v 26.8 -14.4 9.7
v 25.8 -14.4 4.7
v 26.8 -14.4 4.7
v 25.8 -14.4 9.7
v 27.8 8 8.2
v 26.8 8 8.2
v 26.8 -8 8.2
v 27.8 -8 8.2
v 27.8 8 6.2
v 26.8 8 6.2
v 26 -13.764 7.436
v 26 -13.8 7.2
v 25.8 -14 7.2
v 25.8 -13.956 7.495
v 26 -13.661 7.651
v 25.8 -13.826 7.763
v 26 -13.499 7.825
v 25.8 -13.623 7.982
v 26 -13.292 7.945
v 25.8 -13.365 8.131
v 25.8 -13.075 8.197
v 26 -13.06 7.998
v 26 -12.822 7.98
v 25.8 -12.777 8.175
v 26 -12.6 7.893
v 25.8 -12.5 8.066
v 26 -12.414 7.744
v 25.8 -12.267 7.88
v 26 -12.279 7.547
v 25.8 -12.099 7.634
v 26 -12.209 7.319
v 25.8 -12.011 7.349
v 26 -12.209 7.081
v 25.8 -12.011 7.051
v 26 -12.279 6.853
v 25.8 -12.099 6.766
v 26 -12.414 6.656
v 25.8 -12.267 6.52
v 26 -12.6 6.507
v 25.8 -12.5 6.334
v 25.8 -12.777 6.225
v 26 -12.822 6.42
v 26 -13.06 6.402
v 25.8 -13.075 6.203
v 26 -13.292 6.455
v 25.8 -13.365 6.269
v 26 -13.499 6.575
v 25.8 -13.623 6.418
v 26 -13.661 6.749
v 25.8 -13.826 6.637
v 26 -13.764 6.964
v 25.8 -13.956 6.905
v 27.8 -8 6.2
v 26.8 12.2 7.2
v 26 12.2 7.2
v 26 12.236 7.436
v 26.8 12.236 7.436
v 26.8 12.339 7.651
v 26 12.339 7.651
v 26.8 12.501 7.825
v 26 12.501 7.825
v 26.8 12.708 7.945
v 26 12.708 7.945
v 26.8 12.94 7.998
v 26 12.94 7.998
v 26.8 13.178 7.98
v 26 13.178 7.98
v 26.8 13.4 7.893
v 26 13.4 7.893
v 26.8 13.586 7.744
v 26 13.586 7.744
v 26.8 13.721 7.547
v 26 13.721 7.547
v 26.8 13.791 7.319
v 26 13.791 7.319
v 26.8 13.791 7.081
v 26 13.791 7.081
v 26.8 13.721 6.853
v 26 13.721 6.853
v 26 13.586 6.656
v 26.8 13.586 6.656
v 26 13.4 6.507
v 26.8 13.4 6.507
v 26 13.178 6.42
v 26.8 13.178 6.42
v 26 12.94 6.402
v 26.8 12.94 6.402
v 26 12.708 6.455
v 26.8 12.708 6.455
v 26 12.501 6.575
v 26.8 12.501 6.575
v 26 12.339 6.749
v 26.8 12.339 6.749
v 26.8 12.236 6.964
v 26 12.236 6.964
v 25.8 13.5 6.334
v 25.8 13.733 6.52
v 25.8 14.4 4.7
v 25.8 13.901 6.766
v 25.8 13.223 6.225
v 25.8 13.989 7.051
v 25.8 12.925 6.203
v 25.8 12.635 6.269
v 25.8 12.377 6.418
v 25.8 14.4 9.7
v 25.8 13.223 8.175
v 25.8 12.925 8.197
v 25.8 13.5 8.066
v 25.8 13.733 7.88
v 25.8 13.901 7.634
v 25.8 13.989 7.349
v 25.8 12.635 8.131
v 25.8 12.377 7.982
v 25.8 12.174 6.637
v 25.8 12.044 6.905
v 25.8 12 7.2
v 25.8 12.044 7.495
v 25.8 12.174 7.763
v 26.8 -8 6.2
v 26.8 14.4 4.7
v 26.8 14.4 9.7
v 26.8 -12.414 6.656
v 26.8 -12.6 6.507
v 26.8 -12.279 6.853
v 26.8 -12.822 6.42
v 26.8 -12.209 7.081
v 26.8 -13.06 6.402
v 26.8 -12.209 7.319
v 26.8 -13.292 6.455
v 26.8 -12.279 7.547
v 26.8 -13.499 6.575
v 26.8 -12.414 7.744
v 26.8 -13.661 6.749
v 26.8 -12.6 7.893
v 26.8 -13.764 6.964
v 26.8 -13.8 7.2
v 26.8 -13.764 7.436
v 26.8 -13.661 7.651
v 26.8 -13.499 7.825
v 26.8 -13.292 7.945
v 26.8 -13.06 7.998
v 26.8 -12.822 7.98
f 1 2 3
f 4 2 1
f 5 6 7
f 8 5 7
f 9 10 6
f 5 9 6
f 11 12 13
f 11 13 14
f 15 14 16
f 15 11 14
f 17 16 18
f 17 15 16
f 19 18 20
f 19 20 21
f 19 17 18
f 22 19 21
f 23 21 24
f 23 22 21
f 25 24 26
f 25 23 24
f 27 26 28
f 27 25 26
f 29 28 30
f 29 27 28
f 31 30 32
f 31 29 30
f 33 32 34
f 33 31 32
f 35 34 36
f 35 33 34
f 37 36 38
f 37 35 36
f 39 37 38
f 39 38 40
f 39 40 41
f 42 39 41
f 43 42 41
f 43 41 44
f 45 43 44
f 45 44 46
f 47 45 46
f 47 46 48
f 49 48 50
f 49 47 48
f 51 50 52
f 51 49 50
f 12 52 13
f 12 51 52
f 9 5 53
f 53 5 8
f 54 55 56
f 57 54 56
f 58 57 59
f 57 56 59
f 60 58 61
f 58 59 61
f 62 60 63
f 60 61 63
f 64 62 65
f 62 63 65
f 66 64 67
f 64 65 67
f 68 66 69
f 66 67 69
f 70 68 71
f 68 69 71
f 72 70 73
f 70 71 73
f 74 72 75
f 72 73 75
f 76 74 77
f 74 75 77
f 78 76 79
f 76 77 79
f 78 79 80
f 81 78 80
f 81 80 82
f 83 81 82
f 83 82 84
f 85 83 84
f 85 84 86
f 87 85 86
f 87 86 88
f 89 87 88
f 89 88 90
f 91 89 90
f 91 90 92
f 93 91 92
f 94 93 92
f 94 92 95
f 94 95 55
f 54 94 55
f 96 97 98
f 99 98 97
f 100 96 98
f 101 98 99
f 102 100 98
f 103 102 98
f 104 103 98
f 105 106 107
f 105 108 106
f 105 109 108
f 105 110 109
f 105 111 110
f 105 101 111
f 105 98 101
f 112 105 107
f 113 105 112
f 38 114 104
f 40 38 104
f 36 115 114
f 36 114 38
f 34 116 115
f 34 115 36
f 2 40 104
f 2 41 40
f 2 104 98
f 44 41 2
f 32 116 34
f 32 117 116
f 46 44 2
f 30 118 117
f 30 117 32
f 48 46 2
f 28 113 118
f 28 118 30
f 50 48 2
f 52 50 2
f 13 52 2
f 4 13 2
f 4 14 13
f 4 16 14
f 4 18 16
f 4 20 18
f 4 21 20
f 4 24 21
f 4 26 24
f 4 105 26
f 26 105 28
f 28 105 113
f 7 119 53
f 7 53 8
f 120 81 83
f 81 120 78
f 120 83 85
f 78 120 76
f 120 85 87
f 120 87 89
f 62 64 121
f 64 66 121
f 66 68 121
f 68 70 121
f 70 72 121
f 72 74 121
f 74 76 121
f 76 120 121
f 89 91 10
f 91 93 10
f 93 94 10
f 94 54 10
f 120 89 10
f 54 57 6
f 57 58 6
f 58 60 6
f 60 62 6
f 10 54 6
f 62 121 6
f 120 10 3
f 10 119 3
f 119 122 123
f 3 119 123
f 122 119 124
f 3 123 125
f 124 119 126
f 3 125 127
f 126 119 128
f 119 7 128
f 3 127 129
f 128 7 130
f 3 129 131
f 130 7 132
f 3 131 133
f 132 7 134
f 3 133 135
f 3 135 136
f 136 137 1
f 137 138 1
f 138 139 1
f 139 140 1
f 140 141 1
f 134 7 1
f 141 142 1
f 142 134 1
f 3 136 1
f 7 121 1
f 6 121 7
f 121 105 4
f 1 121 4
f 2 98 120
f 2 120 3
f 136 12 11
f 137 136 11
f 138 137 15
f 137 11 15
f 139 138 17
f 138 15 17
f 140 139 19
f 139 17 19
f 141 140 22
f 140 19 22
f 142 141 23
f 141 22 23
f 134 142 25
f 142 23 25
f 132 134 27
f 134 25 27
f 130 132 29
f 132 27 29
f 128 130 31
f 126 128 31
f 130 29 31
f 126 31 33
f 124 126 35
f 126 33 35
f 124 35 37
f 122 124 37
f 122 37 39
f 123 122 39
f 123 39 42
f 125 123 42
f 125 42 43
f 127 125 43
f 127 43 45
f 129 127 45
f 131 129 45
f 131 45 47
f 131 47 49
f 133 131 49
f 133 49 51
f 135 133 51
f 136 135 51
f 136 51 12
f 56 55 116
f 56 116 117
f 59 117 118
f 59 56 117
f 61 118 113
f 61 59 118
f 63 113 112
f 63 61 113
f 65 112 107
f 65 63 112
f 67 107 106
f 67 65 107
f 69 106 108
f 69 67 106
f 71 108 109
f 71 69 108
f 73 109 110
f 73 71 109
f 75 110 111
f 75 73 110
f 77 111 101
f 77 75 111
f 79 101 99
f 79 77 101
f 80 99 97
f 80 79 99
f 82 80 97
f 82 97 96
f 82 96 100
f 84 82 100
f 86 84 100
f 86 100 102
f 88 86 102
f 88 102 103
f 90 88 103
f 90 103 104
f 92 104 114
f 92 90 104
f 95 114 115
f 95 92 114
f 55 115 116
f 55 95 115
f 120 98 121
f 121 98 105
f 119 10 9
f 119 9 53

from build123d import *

# Parameters (mm, degrees)
SKETCH056_W             = 28.8
SKETCH056_H             = 5
PAD024_DEPTH            = 1
SKETCH057_W             = 16
SKETCH057_H             = 2
PAD025_DEPTH            = 2
SKETCH058_R             = 0.8
POCKET026_DEPTH         = 5
CHAMFER023_SIZE         = 0.2
BODY019_PLACEMENT_ANGLE = 180


with BuildPart() as part:
    # Sketch056 → Pad024 (new body)
    with BuildSketch(Plane.YZ):
        with Locations((0, 7.7)):
            Rectangle(SKETCH056_W, SKETCH056_H)
    extrude(amount=-PAD024_DEPTH)

    # Sketch057 → Pad025 (join)
    with BuildSketch(Plane.YZ):
        with Locations((0, 7.7)):
            Rectangle(SKETCH057_W, SKETCH057_H)
    extrude(amount=-PAD025_DEPTH)

    # Sketch058 → Pocket026 (cut)
    with BuildSketch(Plane.YZ):
        with Locations((-13, 7.7)):
            Circle(SKETCH058_R)
        with Locations((13, 7.7)):
            Circle(SKETCH058_R)
    extrude(amount=-POCKET026_DEPTH, mode=Mode.SUBTRACT)

    # Chamfer023
    chamfer023_edges = [part.edges().sort_by_distance(p)[0] for p in [
        (0, -13.8, 7.7),
        (0, 12.2, 7.7),
    ]]
    chamfer(chamfer023_edges, length=CHAMFER023_SIZE)


with BuildPart() as part_1:
    # Body019 placement: moved
    add(part.part.moved(Location((25.8, 0, -0.5))).rotate(Axis((25.8, 0, -0.5), (0, 0, 1)), BODY019_PLACEMENT_ANGLE))


solid = part_1.part
